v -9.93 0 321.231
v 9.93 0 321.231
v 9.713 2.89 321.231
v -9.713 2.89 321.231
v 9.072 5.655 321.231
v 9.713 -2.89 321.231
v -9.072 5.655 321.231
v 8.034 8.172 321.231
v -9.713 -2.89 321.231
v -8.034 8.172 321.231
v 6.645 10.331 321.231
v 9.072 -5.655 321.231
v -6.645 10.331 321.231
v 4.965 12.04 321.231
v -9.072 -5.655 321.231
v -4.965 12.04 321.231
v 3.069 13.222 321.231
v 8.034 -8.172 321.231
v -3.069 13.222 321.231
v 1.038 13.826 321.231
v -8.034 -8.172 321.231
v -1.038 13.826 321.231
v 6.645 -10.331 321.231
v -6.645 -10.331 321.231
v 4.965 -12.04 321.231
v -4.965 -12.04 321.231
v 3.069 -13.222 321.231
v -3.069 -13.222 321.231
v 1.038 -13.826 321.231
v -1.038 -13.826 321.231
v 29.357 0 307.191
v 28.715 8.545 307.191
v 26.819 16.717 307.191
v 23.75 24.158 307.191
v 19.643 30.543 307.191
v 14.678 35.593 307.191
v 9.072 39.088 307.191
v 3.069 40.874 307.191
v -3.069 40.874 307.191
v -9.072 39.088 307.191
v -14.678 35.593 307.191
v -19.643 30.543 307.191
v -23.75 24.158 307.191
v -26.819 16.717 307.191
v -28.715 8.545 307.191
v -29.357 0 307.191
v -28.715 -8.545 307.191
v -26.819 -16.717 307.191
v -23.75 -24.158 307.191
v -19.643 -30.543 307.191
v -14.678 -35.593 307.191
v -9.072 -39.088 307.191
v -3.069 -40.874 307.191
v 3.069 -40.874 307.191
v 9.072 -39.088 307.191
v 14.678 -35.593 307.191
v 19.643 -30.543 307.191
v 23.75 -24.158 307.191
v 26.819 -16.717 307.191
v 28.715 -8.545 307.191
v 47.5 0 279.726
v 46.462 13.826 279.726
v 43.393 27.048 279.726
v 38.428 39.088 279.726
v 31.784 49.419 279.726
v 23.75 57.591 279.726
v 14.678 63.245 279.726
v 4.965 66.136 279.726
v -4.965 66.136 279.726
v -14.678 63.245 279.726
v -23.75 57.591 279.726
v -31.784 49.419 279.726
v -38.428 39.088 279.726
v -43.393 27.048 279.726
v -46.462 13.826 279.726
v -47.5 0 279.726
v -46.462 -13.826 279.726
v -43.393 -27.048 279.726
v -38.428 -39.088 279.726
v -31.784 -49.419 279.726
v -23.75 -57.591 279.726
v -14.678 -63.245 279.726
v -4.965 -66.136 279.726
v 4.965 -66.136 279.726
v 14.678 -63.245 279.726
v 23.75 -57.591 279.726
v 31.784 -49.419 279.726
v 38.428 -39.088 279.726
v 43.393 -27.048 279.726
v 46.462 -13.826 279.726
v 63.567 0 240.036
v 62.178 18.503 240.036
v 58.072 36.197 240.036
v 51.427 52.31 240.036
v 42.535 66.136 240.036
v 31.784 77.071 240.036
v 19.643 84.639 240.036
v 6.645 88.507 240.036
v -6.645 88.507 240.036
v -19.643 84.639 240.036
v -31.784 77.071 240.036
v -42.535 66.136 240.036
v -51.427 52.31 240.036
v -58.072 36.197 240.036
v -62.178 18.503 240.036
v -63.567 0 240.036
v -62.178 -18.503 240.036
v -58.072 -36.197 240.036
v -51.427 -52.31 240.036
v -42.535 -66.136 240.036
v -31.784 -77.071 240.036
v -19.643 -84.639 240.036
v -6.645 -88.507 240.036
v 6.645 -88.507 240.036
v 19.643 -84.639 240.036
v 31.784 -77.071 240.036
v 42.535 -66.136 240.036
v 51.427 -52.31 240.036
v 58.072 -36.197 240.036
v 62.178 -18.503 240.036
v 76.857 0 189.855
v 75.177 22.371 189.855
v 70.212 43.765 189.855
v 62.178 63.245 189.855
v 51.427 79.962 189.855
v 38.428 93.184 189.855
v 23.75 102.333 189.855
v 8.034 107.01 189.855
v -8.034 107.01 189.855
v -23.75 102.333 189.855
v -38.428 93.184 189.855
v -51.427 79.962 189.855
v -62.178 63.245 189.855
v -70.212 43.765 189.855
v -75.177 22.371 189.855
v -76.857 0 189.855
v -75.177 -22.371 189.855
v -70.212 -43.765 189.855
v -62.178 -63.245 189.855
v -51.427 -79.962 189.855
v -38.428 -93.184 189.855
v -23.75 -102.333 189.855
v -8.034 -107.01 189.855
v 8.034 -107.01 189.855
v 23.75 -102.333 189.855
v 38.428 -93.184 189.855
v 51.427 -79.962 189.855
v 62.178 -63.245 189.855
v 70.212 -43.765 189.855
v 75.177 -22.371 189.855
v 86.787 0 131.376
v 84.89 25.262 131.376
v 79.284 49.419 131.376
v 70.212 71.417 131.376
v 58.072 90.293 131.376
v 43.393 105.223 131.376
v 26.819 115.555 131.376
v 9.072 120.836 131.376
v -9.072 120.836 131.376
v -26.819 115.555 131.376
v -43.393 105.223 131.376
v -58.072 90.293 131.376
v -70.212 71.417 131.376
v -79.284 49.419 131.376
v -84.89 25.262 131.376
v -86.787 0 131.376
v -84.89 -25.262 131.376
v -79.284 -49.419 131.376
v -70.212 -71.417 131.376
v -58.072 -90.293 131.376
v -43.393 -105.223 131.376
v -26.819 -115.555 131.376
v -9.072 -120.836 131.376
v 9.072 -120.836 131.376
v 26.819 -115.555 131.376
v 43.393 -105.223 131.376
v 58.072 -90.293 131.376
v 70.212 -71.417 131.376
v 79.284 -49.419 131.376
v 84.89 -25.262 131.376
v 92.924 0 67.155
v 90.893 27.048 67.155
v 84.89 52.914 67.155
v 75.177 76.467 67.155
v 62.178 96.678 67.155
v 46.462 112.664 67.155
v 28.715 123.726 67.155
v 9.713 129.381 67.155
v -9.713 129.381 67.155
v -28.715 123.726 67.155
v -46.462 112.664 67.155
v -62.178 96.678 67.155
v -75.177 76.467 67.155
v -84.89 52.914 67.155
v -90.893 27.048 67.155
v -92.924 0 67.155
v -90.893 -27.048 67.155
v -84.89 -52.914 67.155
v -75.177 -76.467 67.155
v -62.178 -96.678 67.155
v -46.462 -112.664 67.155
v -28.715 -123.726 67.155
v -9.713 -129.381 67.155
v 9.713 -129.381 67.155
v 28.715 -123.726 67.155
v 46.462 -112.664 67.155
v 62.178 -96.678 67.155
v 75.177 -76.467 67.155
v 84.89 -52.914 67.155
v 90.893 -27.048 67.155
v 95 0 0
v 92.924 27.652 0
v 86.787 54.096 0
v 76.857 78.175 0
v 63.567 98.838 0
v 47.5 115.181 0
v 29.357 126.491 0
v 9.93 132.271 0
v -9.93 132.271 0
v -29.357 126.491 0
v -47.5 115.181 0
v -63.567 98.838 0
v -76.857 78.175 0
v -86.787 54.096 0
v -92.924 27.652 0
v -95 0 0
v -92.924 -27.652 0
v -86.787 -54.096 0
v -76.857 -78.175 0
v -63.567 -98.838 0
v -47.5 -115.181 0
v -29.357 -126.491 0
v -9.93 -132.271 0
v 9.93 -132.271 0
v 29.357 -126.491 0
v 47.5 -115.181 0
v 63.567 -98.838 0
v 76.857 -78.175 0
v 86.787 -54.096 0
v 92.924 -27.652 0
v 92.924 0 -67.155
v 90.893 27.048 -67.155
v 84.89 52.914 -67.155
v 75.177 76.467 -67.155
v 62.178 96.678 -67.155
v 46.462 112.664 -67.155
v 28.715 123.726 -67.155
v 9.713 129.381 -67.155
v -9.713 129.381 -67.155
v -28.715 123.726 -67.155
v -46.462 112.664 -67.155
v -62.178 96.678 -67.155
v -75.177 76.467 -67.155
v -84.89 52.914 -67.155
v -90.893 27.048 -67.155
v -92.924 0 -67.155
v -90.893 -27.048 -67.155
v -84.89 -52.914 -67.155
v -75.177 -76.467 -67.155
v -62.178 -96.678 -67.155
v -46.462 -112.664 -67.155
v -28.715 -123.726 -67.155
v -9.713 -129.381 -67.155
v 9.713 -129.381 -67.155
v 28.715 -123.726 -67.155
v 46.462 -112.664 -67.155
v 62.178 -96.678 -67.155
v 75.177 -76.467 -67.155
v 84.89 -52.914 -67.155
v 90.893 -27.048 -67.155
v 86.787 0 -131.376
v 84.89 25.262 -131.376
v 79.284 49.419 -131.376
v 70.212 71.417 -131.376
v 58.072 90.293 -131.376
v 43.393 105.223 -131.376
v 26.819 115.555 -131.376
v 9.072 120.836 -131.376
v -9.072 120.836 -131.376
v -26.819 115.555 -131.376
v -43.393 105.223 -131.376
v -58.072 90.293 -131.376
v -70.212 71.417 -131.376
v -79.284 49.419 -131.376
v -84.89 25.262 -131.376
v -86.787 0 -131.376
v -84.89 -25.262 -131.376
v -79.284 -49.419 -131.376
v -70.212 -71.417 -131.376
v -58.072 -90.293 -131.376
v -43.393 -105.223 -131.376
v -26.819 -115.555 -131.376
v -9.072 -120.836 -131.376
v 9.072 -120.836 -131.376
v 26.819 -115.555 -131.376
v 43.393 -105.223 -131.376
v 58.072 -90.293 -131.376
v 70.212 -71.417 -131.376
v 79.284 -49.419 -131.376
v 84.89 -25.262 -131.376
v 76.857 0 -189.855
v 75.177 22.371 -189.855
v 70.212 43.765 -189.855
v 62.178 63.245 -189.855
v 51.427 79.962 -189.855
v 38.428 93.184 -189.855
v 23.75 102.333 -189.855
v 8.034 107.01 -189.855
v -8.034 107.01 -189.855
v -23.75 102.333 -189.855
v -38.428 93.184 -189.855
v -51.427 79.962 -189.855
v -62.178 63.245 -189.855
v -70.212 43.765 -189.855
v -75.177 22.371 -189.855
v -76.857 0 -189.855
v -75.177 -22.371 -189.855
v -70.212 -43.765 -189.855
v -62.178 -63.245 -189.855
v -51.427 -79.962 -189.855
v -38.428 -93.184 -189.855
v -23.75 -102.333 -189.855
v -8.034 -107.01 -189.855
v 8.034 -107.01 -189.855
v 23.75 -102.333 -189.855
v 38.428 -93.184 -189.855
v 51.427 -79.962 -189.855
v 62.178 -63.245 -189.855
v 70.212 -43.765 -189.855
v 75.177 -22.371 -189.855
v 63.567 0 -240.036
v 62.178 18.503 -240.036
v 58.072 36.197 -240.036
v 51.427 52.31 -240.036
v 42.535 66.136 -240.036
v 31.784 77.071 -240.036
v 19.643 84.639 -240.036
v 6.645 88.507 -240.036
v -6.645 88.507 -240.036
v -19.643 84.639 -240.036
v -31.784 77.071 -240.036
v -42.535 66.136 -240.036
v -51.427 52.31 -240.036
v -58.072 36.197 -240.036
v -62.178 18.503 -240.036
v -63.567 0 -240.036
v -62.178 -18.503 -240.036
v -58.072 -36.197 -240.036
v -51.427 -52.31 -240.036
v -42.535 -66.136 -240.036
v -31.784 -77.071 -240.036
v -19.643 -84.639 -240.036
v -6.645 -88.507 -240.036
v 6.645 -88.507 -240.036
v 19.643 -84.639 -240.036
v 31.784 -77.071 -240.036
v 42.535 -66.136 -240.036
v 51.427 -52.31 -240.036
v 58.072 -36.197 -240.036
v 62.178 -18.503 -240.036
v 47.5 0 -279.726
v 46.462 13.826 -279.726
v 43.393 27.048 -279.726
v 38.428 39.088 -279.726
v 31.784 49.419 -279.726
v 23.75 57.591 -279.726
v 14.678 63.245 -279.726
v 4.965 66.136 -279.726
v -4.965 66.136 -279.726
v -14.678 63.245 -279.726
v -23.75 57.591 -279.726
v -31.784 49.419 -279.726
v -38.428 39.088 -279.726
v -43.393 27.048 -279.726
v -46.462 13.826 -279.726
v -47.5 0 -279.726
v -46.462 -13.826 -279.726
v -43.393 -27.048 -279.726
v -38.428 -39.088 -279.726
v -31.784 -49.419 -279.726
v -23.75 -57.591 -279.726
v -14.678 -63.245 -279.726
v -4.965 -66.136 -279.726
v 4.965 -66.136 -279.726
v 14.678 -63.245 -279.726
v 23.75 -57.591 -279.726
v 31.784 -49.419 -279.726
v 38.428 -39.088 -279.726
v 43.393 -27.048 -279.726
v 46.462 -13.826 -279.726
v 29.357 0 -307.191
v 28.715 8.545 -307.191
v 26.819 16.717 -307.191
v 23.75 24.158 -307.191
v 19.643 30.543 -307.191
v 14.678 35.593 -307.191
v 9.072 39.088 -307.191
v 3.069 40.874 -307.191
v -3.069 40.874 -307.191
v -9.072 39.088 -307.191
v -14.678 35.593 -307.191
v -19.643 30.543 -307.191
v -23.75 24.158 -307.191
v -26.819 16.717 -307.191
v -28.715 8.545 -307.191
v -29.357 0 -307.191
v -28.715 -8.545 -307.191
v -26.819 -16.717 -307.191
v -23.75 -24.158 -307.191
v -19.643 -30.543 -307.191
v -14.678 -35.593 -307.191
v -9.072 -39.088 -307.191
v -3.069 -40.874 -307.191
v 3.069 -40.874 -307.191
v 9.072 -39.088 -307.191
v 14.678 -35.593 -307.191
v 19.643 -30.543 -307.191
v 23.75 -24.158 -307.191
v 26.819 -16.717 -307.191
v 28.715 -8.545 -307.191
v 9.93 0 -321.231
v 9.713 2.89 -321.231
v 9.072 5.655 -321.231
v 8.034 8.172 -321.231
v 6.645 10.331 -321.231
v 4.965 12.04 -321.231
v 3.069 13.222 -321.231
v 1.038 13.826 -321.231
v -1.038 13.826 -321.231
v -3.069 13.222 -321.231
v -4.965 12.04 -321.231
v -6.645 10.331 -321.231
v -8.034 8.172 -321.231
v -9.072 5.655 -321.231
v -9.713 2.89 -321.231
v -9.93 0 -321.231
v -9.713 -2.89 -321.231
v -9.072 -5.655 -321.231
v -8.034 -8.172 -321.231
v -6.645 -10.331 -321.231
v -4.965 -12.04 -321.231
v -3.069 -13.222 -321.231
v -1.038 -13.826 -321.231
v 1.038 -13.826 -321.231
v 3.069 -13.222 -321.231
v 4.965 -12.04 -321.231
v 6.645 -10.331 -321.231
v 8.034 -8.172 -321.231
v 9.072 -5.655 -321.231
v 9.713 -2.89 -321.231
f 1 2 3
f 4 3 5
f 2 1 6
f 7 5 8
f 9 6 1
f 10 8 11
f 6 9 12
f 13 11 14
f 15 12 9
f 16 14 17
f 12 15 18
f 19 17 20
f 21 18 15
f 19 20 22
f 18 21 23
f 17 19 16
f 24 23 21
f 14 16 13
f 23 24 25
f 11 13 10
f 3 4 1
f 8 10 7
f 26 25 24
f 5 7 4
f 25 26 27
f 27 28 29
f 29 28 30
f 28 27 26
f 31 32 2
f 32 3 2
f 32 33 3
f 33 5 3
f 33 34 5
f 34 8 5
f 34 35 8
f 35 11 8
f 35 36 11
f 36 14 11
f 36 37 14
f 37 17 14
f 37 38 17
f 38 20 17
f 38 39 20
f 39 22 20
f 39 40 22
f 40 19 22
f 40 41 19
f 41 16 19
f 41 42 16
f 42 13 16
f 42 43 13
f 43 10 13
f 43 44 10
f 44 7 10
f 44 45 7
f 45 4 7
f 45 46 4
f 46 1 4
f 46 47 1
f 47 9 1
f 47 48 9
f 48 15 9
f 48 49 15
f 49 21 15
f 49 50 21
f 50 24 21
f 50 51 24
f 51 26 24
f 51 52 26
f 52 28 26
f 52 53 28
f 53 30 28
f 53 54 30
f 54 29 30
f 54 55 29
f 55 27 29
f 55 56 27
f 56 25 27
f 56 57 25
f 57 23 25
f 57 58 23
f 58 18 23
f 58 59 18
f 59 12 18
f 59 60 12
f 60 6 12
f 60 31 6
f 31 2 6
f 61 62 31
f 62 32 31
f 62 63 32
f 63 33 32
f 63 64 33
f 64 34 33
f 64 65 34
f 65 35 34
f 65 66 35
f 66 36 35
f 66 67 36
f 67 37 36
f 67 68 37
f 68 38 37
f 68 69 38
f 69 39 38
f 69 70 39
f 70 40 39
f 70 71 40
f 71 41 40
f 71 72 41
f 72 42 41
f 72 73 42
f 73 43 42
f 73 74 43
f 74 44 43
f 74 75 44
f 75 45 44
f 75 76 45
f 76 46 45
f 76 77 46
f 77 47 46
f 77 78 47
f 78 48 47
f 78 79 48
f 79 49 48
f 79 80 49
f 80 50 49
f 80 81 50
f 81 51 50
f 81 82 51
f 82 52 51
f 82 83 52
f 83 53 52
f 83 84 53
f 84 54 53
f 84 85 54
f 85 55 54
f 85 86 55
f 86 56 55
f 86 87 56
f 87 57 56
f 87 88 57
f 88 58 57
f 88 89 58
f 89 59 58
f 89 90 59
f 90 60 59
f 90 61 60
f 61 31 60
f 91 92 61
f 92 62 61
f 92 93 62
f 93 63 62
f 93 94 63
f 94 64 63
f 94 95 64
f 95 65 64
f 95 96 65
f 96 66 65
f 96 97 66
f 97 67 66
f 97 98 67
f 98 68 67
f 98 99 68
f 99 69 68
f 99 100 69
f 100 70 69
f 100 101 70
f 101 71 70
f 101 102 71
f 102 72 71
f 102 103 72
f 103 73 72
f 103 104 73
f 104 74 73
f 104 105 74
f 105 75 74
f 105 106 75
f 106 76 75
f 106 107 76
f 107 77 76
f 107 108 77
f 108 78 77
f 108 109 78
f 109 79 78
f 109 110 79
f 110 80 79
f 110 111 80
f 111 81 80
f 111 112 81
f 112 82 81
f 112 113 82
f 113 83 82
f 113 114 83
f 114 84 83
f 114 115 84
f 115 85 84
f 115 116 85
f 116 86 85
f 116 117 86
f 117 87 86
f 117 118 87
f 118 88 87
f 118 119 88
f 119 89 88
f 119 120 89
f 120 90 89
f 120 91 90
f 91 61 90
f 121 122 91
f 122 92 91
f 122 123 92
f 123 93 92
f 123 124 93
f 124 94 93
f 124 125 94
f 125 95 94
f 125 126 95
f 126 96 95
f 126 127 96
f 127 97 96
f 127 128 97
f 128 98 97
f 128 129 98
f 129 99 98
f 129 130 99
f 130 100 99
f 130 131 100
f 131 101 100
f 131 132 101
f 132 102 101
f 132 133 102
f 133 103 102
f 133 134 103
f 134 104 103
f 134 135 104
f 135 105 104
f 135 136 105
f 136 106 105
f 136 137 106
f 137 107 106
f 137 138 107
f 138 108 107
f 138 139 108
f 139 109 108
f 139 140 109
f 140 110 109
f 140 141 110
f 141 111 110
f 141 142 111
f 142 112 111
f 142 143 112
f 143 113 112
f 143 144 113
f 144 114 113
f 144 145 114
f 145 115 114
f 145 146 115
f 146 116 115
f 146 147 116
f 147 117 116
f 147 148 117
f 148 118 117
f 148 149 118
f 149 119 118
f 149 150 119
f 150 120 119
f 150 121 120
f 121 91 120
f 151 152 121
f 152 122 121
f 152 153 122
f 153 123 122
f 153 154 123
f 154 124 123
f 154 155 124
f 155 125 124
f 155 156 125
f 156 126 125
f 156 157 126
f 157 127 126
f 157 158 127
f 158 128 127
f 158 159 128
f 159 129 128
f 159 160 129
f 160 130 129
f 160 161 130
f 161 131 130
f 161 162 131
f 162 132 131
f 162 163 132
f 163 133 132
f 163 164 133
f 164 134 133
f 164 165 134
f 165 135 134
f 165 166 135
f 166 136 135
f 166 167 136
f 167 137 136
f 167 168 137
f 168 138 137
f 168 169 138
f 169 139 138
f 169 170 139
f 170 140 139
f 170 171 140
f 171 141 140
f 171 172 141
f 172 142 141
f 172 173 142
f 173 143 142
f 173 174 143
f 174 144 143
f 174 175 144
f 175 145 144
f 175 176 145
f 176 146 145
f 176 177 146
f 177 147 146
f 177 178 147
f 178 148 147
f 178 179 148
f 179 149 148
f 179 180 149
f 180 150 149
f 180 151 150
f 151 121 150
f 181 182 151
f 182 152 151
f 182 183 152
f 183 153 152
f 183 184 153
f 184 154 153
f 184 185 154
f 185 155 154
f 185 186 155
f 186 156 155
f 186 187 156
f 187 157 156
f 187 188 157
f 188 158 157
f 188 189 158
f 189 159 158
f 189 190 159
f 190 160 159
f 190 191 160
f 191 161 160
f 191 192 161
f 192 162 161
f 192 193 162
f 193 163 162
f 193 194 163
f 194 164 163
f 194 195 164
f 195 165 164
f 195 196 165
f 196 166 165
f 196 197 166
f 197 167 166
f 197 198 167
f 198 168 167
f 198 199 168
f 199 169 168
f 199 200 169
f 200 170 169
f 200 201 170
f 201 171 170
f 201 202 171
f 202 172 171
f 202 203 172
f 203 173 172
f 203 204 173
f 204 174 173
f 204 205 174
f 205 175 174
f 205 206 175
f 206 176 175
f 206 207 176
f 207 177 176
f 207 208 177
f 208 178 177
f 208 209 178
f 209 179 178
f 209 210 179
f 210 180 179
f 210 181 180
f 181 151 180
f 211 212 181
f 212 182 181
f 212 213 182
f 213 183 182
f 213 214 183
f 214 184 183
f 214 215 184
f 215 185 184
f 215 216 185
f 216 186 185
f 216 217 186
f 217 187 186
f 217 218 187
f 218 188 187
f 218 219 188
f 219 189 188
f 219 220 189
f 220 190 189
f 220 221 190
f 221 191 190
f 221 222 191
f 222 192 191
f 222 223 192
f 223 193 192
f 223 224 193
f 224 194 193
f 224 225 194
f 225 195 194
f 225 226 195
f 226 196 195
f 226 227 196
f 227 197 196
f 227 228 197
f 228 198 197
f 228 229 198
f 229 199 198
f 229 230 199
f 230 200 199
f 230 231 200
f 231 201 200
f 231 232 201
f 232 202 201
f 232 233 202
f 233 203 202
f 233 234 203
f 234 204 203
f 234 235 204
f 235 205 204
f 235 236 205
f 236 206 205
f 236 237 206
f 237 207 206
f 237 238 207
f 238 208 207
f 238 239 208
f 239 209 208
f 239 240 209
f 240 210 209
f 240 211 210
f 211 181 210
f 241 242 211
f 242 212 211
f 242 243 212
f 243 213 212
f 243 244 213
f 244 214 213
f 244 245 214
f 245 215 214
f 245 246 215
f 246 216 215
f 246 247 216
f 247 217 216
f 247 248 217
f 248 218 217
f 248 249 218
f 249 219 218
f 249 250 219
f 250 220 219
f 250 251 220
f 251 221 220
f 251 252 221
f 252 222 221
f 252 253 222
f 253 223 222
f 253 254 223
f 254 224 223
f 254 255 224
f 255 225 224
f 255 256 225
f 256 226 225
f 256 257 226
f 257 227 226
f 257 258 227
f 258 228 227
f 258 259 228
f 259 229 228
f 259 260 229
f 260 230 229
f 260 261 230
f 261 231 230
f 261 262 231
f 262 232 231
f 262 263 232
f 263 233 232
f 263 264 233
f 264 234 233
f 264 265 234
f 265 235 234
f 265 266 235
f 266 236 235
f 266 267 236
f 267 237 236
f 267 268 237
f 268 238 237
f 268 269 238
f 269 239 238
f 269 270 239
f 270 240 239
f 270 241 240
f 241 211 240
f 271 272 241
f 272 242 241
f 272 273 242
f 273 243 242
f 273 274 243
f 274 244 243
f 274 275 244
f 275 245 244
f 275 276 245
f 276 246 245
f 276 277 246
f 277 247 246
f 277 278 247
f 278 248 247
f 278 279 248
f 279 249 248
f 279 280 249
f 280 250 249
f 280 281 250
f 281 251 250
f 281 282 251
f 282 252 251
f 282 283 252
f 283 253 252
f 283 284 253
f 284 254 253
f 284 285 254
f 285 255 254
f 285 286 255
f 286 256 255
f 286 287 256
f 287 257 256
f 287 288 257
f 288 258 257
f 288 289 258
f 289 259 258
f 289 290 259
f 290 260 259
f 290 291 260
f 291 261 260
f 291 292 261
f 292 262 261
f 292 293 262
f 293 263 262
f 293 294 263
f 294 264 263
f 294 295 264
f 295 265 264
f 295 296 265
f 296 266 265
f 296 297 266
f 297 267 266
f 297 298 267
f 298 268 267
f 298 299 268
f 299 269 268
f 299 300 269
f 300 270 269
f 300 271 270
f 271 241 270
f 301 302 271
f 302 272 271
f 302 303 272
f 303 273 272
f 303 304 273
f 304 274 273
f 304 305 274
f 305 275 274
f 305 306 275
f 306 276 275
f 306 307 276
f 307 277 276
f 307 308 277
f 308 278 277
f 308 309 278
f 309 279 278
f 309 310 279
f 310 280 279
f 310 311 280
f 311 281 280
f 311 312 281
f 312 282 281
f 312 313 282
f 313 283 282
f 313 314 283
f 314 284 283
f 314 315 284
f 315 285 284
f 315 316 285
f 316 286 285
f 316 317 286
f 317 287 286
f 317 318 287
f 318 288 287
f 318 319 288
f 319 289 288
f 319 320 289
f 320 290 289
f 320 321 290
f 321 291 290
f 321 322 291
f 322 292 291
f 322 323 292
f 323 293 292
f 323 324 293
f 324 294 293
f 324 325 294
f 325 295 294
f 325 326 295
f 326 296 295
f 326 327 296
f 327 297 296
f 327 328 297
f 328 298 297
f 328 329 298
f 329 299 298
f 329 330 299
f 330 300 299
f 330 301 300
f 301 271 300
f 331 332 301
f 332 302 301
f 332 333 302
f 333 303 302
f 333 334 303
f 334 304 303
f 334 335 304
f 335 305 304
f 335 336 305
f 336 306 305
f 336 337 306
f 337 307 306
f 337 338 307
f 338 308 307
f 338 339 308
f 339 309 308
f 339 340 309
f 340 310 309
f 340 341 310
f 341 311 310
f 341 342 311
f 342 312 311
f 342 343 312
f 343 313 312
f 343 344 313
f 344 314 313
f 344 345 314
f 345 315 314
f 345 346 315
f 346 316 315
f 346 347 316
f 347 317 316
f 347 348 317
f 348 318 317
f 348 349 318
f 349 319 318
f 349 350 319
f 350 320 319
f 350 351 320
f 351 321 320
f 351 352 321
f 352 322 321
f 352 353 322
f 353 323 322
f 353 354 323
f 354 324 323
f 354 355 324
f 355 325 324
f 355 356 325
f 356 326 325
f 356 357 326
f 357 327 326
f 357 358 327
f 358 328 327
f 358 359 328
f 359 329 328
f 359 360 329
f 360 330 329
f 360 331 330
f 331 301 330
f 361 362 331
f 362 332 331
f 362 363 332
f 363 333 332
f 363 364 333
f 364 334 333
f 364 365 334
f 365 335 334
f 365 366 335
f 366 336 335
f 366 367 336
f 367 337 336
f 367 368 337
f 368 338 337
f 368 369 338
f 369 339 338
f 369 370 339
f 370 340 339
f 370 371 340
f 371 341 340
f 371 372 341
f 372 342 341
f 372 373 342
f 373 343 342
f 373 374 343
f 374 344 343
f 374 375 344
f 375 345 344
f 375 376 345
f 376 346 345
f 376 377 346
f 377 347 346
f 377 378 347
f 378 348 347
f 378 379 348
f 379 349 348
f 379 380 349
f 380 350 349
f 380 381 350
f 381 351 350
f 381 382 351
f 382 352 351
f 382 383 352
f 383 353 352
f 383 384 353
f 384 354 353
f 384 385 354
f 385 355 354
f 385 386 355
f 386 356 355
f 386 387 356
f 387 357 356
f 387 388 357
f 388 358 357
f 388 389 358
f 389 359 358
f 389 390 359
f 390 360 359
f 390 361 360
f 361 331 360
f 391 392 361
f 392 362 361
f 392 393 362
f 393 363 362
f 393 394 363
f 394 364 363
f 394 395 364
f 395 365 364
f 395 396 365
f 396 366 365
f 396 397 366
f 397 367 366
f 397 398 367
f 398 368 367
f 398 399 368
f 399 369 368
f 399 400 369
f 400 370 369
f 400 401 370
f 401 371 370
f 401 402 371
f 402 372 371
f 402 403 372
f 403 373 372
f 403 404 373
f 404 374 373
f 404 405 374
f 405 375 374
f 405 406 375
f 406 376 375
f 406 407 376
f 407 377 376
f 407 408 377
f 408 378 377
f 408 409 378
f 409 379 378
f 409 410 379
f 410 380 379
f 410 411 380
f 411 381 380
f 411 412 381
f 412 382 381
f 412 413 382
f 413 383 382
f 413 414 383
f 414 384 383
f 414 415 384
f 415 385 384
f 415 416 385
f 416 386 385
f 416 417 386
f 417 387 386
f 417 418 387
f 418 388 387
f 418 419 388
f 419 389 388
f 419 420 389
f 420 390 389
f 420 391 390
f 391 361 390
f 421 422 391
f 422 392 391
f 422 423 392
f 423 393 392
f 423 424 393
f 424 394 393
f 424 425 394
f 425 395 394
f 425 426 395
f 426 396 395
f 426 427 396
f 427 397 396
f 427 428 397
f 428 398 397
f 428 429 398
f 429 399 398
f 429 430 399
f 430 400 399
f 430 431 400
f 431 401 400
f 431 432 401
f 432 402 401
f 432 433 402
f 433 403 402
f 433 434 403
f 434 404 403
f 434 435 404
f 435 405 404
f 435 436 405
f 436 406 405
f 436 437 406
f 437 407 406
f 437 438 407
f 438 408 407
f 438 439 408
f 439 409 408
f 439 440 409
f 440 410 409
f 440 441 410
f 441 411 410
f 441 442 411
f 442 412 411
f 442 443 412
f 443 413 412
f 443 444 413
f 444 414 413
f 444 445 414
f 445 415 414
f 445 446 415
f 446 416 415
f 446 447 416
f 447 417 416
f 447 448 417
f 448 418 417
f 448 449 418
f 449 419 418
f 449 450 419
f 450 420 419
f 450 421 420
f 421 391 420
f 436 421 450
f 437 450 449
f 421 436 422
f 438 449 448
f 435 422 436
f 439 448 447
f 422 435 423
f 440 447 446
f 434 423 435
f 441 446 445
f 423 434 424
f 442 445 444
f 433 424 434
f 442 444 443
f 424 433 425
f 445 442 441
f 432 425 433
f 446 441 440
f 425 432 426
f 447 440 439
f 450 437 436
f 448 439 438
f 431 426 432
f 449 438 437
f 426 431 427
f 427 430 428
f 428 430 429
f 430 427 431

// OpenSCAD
// Generated by SolidPython 1.0.1 on 2020-07-29 00:46:46


scale(v = [5, 7, 17]) {
	sphere(r = 19);
}
/***********************************************
*********      SolidPython code:      **********
************************************************
 
# import packages: SolidPython
from solid import *
from solid.utils import *
from itertools import chain, combinations, permutations


class Resize:

    def __init__(self, scad_file):
        self.scad_file = scad_file
        #self.scad_file = import_scad(scad_file)
        # cone/cylinder param:
        self.r1 = 0
        self.r2 = 0
        self.h = 0
        # rectangular prism param:
        self.w = 0
        self.l = 0
        # ellipse param:
        self.r = 0

    # import OpenScad code (file name corresponds to shape)


    # classify shape + parameters
    def assign(self, param1, param2, param3):
        if self.scad_file == 'cone.scad':
            self.r1 = param1
            self.r2 = param2
            self.h = param3
        elif self.scad_file == 'cylinder.scad':
            self.r1 = param1
            self.r2 = param2
            self.h = param3
        elif self.scad_file == 'rectangularPrism.scad':
            self.h = param1
            self.l = param2
            self.w = param3
        else:
            self.r = param1
            self.h = param2

    # resize parameters
    def iterate(self):
        x = range(3, 20, 2)
        i = 1
        if self.scad_file == 'cone.scad':
            tempList = list(permutations(x, 2))
            for temp in tempList:
                param1 = temp[0]
                param2 = temp[1]
                filepath = 'produced_scad_files/' + 'cone' + str(param1) + '_' + str(param2) + '_' + '.scad'
                scad_render_to_file(cylinder(h=param1, r1=param2, r2=0), filepath)

        elif self.scad_file == 'cylinder.scad':
            tempList = list(permutations(x, 3))
            for temp in tempList:
                param1 = temp[0]
                param2 = temp[1]
                filepath = 'produced_scad_files/' + 'cylinder' + str(param1) + '_' + str(param2) + '_' + '.scad'
                scad_render_to_file(cylinder(h=param1, r1=param2, r2=param2), filepath)

        elif self.scad_file == 'rectangularPrism.scad':
            tempList = list(permutations(x, 3))
            for temp in tempList:
                param1 = temp[0]
                param2 = temp[1]
                param3 = temp[2]
                filepath = 'produced_scad_files/' + 'rectangularPrism' + str(param1) + '_' + str(param2) + '_' + str(
                    param3) + '.scad'
                scad_render_to_file(cube(size=(param1, param2, param3)), filepath)

        elif self.scad_file == 'ellipse.scad':
            tempList = list(permutations(x, 4))
            for temp in tempList:
                param1 = temp[0]
                param2 = temp[1]
                param3 = temp[2]
                param4 = temp[3]
                filepath = 'produced_scad_files/' + 'ellipse' + str(param1) + '_' + str(param2) + '_' + str(param3) + '_' + str(param4) + '.scad'
                scad_render_to_file(scale([param1, param2, param3])(sphere(r=param4)), filepath)

    def render_to_scadfile(self):
        scad_render_to_file(scad, 'example.scad') 
 
************************************************/
